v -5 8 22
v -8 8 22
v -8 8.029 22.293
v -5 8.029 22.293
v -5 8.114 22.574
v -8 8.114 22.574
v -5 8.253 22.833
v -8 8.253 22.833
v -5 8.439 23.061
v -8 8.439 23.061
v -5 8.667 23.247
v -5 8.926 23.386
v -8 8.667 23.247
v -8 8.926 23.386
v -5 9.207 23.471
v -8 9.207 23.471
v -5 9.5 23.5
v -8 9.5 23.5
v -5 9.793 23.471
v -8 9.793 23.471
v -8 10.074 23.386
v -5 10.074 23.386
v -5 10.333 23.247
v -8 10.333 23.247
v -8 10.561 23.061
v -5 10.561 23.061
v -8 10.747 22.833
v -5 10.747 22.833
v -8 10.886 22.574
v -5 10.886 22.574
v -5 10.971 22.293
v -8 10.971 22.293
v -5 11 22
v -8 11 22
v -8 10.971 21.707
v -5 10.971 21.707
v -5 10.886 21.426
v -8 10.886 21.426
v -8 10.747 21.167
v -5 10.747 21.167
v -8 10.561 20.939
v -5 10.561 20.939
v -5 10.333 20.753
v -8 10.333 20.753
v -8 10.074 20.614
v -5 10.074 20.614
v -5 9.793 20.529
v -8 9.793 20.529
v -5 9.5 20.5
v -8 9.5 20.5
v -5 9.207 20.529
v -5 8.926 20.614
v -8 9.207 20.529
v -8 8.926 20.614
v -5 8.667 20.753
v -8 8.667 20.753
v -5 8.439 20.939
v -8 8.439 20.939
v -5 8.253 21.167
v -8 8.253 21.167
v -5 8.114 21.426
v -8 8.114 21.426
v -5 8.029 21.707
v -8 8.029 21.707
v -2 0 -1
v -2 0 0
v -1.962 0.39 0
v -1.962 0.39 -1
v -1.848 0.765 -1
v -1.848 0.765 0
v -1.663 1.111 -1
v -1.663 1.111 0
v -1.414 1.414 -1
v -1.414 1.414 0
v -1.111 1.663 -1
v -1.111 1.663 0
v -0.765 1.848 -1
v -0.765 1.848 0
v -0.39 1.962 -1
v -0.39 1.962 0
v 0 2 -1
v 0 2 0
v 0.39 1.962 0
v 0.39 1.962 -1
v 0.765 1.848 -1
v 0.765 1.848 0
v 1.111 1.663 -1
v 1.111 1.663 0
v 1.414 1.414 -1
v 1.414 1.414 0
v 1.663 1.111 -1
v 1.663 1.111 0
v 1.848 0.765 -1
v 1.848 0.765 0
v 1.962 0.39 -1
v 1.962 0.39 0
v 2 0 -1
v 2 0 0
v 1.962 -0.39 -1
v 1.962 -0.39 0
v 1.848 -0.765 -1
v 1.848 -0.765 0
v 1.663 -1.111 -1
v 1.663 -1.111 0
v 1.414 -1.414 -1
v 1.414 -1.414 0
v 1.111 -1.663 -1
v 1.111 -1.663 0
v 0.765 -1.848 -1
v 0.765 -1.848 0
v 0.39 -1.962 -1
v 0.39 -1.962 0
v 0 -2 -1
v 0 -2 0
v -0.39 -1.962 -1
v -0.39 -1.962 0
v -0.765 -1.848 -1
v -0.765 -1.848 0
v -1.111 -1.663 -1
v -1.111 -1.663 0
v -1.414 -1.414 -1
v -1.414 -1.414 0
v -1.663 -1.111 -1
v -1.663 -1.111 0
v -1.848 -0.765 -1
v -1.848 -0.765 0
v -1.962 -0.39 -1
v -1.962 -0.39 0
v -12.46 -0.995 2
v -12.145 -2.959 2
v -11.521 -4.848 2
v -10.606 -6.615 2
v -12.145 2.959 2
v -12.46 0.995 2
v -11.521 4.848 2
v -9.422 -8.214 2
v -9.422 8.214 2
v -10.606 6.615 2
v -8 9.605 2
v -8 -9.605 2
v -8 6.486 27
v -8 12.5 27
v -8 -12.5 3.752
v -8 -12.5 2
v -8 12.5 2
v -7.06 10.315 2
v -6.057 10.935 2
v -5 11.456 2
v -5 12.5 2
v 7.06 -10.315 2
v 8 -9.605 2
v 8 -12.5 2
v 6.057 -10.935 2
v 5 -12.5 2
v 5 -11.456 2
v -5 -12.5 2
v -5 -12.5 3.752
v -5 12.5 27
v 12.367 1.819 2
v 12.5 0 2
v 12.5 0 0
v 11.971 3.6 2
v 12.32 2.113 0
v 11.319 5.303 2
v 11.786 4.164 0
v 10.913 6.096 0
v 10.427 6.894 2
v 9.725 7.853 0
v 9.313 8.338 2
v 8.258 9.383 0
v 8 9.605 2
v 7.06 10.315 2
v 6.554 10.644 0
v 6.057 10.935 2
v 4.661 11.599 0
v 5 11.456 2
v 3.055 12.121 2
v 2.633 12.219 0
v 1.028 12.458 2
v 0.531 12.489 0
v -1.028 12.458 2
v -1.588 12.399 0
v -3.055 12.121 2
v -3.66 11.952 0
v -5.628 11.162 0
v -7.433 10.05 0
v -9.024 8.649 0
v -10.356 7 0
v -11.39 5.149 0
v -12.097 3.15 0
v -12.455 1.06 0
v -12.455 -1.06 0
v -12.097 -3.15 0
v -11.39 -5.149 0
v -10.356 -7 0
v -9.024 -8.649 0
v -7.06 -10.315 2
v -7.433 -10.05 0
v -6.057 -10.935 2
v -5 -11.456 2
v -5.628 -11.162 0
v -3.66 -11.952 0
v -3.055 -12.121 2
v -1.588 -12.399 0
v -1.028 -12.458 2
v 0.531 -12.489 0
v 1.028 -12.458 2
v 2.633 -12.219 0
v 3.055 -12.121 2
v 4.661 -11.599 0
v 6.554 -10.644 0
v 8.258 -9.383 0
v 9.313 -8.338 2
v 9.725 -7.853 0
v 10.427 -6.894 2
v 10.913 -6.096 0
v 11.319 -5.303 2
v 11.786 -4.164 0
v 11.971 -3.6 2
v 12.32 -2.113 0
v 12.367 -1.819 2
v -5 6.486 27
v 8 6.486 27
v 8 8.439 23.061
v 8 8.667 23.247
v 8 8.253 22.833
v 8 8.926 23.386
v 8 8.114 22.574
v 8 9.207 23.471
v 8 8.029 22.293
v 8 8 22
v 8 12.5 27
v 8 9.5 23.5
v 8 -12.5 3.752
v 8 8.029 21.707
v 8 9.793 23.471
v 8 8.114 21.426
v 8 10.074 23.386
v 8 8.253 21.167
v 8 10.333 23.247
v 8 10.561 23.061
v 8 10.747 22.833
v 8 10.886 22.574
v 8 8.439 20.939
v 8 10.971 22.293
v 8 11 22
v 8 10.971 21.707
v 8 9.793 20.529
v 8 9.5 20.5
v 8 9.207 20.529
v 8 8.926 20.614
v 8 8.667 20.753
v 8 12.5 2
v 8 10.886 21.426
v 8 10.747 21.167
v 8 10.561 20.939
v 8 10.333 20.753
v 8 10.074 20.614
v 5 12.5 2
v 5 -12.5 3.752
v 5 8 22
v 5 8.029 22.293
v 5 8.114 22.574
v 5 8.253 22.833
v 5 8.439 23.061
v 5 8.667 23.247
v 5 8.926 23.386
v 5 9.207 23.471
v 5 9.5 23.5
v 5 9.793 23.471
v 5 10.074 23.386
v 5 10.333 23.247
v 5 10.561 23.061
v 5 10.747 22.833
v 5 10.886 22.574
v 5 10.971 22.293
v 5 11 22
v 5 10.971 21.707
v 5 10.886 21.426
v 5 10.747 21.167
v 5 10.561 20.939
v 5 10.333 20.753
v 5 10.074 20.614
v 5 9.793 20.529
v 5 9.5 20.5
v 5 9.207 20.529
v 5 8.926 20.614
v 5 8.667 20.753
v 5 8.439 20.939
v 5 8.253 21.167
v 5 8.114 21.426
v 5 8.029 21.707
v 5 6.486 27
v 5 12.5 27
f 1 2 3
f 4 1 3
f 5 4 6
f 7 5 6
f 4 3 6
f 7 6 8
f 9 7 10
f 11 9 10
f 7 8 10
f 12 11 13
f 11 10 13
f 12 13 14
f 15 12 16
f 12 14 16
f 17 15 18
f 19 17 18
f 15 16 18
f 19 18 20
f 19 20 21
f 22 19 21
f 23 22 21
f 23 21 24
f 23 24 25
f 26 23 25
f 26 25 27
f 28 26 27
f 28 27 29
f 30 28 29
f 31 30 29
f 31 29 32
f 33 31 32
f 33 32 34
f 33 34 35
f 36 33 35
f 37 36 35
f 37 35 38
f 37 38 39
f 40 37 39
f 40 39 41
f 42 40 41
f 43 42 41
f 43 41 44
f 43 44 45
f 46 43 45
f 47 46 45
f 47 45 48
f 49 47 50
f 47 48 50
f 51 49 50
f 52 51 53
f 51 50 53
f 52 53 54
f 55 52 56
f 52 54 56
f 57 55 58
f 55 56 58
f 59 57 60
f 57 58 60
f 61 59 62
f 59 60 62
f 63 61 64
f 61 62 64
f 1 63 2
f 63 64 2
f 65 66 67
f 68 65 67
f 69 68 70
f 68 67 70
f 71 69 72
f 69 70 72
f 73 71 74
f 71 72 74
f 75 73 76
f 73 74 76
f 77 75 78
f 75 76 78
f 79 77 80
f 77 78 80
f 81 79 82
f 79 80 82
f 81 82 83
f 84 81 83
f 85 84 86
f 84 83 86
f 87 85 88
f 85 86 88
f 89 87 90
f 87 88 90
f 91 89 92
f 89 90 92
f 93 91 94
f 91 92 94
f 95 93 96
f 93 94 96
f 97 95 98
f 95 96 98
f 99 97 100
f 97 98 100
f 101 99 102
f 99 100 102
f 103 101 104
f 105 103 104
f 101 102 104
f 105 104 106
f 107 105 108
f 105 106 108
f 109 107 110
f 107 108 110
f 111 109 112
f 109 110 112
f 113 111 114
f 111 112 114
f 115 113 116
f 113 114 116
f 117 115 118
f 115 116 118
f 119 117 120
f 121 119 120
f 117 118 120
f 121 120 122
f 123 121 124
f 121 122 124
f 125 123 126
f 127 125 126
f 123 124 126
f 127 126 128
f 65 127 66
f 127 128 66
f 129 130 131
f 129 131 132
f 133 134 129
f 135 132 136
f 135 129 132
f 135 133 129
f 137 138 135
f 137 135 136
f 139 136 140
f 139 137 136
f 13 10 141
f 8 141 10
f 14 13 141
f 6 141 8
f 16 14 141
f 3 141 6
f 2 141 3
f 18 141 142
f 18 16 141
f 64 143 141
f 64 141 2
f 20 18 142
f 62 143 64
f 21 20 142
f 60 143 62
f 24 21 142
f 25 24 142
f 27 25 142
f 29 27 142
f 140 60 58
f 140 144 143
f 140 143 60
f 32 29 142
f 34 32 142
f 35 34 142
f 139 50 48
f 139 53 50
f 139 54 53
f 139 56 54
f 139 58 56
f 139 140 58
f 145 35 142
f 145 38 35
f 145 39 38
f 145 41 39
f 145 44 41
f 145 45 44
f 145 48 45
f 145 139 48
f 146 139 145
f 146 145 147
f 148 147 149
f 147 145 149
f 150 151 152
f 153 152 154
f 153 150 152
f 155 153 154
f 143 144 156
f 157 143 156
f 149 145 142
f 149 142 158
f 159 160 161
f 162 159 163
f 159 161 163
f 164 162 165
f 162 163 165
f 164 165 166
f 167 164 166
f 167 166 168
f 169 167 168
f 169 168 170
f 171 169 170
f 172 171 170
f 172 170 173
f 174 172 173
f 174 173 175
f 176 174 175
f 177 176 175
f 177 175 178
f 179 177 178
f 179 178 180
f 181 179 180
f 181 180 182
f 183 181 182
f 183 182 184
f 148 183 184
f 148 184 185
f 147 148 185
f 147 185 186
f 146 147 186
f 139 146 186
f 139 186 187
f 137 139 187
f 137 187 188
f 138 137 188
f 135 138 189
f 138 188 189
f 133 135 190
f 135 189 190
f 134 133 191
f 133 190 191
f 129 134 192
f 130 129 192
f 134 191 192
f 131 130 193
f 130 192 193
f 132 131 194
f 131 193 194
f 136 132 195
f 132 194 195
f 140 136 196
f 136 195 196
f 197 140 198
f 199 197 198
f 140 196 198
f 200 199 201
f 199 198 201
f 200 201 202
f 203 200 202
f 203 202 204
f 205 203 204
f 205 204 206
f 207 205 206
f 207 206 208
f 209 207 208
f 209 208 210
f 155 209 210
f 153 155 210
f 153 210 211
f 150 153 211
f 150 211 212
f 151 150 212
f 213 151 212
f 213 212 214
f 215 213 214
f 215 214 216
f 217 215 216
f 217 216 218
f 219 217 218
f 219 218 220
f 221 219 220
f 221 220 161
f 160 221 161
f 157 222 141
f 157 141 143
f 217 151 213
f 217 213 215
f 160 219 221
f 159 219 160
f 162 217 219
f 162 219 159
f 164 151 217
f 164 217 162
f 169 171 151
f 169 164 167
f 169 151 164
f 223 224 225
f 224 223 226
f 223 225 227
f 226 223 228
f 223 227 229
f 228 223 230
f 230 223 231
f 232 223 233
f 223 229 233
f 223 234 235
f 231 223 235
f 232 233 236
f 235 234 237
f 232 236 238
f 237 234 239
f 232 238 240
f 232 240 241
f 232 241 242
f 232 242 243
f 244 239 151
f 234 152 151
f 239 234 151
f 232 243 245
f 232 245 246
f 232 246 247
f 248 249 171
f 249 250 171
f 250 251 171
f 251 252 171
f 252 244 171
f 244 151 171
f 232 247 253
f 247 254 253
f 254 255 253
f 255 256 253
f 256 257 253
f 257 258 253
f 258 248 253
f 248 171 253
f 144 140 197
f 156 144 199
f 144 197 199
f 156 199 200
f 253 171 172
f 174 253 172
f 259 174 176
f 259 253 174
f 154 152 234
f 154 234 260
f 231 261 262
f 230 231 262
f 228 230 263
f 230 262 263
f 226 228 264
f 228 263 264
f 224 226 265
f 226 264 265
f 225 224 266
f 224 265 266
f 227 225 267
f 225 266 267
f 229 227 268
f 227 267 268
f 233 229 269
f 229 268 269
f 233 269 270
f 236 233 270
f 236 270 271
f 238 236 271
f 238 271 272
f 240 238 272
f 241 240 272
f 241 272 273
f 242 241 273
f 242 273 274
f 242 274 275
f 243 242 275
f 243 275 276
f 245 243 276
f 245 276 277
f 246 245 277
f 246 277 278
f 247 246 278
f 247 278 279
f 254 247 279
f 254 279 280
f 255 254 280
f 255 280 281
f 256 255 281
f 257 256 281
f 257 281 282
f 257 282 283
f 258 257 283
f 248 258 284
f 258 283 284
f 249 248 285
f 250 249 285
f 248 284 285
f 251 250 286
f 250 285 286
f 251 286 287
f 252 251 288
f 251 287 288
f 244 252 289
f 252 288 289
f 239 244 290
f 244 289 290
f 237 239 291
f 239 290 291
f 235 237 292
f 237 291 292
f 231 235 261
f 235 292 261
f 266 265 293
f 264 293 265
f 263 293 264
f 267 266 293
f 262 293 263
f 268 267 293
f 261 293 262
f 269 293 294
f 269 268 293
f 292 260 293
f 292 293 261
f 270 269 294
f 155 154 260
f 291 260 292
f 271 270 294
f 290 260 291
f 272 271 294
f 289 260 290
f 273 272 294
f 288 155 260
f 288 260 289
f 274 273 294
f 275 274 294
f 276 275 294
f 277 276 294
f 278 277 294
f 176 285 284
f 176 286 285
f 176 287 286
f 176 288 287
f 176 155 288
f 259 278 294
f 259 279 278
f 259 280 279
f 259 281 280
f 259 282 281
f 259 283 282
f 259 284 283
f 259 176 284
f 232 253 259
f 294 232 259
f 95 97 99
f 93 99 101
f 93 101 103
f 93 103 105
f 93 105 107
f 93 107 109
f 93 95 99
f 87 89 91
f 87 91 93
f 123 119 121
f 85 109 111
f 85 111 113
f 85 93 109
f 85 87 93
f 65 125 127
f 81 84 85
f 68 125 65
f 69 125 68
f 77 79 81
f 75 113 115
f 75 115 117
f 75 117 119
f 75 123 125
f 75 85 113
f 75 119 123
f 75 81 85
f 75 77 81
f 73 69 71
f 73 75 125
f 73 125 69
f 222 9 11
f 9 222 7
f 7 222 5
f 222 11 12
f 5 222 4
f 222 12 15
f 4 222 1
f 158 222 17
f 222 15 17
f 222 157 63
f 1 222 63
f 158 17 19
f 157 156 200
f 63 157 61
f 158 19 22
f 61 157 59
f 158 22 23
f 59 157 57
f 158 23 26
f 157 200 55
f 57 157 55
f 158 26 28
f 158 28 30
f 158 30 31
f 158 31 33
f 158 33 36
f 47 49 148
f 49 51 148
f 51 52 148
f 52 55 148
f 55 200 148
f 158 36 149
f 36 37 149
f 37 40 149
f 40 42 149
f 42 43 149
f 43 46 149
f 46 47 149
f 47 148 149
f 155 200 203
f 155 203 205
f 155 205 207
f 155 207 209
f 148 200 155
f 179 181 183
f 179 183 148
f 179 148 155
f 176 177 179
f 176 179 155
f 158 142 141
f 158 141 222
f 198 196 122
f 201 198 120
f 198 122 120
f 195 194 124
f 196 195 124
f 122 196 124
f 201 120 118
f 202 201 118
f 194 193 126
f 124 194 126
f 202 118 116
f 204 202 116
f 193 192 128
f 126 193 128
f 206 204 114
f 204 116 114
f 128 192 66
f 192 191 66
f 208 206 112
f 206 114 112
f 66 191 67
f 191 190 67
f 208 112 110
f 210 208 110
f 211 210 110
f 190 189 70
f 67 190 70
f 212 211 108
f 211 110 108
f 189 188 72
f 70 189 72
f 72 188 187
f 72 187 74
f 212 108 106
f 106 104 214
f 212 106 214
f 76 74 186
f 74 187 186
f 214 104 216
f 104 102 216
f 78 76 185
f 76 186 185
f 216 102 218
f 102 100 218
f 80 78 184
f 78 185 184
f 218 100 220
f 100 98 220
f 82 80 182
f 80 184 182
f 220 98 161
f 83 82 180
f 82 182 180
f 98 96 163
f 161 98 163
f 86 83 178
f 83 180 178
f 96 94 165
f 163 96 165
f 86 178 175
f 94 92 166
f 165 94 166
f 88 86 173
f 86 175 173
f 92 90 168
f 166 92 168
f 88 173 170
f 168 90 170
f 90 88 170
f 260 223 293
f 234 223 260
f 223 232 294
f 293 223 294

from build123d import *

# Parameters (mm, degrees)
SKETCH1_R           = 12.5
BOSS_EXTRUDE1_DEPTH = 2
SKETCH2_R           = 2
BOSS_EXTRUDE2_DEPTH = 1
SKETCH3_W           = 3
SKETCH3_H           = 25
BOSS_EXTRUDE3_DEPTH = 25
SKETCH5_R           = 1.5
CUT_EXTRUDE1_DEPTH  = 37.13170353
CUT_EXTRUDE2_DEPTH  = 37.13170353


with BuildPart() as part:
    # Sketch1 → Boss-Extrude1 (new body)
    with BuildSketch(Plane.XY):
        Circle(SKETCH1_R)
    extrude(amount=BOSS_EXTRUDE1_DEPTH)

    # Sketch2 → Boss-Extrude2 (add)
    with BuildSketch(Plane(origin=(0, 0, 0), x_dir=(-1, 0, 0), z_dir=(0, 0, -1))):
        Circle(SKETCH2_R)
    extrude(amount=BOSS_EXTRUDE2_DEPTH)

    # Sketch3 → Boss-Extrude3 (add)
    with BuildSketch(Plane.XY.offset(2)):
        with Locations((-6.5, 0)):
            Rectangle(SKETCH3_W, SKETCH3_H)
    boss_extrude3 = extrude(amount=BOSS_EXTRUDE3_DEPTH)

    # Mirror1: Boss-Extrude3 across plane
    add(boss_extrude3.mirror(Plane(origin=(0, 0, 0), x_dir=(0, 0, 1), z_dir=(1, 0, 0))))

    # Sketch5 → Cut-Extrude1 (cut, through all)
    with BuildSketch(Plane.ZY.offset(8)):
        with Locations(Location((22, 9.5, 0), (0, 0, 270))):
            Circle(SKETCH5_R)
    extrude(amount=-CUT_EXTRUDE1_DEPTH, mode=Mode.SUBTRACT)

    # Sketch6 → Cut-Extrude2 (cut, through all)
    with BuildSketch(Plane(origin=(8, 0, 0), x_dir=(0, 0, -1), z_dir=(1, 0, 0))):
        Polygon((-27, 6.485501453), (-3.7517805, -12.5), (-27, -12.5), align=None)
    extrude(amount=-CUT_EXTRUDE2_DEPTH, mode=Mode.SUBTRACT)


solid = part.part
